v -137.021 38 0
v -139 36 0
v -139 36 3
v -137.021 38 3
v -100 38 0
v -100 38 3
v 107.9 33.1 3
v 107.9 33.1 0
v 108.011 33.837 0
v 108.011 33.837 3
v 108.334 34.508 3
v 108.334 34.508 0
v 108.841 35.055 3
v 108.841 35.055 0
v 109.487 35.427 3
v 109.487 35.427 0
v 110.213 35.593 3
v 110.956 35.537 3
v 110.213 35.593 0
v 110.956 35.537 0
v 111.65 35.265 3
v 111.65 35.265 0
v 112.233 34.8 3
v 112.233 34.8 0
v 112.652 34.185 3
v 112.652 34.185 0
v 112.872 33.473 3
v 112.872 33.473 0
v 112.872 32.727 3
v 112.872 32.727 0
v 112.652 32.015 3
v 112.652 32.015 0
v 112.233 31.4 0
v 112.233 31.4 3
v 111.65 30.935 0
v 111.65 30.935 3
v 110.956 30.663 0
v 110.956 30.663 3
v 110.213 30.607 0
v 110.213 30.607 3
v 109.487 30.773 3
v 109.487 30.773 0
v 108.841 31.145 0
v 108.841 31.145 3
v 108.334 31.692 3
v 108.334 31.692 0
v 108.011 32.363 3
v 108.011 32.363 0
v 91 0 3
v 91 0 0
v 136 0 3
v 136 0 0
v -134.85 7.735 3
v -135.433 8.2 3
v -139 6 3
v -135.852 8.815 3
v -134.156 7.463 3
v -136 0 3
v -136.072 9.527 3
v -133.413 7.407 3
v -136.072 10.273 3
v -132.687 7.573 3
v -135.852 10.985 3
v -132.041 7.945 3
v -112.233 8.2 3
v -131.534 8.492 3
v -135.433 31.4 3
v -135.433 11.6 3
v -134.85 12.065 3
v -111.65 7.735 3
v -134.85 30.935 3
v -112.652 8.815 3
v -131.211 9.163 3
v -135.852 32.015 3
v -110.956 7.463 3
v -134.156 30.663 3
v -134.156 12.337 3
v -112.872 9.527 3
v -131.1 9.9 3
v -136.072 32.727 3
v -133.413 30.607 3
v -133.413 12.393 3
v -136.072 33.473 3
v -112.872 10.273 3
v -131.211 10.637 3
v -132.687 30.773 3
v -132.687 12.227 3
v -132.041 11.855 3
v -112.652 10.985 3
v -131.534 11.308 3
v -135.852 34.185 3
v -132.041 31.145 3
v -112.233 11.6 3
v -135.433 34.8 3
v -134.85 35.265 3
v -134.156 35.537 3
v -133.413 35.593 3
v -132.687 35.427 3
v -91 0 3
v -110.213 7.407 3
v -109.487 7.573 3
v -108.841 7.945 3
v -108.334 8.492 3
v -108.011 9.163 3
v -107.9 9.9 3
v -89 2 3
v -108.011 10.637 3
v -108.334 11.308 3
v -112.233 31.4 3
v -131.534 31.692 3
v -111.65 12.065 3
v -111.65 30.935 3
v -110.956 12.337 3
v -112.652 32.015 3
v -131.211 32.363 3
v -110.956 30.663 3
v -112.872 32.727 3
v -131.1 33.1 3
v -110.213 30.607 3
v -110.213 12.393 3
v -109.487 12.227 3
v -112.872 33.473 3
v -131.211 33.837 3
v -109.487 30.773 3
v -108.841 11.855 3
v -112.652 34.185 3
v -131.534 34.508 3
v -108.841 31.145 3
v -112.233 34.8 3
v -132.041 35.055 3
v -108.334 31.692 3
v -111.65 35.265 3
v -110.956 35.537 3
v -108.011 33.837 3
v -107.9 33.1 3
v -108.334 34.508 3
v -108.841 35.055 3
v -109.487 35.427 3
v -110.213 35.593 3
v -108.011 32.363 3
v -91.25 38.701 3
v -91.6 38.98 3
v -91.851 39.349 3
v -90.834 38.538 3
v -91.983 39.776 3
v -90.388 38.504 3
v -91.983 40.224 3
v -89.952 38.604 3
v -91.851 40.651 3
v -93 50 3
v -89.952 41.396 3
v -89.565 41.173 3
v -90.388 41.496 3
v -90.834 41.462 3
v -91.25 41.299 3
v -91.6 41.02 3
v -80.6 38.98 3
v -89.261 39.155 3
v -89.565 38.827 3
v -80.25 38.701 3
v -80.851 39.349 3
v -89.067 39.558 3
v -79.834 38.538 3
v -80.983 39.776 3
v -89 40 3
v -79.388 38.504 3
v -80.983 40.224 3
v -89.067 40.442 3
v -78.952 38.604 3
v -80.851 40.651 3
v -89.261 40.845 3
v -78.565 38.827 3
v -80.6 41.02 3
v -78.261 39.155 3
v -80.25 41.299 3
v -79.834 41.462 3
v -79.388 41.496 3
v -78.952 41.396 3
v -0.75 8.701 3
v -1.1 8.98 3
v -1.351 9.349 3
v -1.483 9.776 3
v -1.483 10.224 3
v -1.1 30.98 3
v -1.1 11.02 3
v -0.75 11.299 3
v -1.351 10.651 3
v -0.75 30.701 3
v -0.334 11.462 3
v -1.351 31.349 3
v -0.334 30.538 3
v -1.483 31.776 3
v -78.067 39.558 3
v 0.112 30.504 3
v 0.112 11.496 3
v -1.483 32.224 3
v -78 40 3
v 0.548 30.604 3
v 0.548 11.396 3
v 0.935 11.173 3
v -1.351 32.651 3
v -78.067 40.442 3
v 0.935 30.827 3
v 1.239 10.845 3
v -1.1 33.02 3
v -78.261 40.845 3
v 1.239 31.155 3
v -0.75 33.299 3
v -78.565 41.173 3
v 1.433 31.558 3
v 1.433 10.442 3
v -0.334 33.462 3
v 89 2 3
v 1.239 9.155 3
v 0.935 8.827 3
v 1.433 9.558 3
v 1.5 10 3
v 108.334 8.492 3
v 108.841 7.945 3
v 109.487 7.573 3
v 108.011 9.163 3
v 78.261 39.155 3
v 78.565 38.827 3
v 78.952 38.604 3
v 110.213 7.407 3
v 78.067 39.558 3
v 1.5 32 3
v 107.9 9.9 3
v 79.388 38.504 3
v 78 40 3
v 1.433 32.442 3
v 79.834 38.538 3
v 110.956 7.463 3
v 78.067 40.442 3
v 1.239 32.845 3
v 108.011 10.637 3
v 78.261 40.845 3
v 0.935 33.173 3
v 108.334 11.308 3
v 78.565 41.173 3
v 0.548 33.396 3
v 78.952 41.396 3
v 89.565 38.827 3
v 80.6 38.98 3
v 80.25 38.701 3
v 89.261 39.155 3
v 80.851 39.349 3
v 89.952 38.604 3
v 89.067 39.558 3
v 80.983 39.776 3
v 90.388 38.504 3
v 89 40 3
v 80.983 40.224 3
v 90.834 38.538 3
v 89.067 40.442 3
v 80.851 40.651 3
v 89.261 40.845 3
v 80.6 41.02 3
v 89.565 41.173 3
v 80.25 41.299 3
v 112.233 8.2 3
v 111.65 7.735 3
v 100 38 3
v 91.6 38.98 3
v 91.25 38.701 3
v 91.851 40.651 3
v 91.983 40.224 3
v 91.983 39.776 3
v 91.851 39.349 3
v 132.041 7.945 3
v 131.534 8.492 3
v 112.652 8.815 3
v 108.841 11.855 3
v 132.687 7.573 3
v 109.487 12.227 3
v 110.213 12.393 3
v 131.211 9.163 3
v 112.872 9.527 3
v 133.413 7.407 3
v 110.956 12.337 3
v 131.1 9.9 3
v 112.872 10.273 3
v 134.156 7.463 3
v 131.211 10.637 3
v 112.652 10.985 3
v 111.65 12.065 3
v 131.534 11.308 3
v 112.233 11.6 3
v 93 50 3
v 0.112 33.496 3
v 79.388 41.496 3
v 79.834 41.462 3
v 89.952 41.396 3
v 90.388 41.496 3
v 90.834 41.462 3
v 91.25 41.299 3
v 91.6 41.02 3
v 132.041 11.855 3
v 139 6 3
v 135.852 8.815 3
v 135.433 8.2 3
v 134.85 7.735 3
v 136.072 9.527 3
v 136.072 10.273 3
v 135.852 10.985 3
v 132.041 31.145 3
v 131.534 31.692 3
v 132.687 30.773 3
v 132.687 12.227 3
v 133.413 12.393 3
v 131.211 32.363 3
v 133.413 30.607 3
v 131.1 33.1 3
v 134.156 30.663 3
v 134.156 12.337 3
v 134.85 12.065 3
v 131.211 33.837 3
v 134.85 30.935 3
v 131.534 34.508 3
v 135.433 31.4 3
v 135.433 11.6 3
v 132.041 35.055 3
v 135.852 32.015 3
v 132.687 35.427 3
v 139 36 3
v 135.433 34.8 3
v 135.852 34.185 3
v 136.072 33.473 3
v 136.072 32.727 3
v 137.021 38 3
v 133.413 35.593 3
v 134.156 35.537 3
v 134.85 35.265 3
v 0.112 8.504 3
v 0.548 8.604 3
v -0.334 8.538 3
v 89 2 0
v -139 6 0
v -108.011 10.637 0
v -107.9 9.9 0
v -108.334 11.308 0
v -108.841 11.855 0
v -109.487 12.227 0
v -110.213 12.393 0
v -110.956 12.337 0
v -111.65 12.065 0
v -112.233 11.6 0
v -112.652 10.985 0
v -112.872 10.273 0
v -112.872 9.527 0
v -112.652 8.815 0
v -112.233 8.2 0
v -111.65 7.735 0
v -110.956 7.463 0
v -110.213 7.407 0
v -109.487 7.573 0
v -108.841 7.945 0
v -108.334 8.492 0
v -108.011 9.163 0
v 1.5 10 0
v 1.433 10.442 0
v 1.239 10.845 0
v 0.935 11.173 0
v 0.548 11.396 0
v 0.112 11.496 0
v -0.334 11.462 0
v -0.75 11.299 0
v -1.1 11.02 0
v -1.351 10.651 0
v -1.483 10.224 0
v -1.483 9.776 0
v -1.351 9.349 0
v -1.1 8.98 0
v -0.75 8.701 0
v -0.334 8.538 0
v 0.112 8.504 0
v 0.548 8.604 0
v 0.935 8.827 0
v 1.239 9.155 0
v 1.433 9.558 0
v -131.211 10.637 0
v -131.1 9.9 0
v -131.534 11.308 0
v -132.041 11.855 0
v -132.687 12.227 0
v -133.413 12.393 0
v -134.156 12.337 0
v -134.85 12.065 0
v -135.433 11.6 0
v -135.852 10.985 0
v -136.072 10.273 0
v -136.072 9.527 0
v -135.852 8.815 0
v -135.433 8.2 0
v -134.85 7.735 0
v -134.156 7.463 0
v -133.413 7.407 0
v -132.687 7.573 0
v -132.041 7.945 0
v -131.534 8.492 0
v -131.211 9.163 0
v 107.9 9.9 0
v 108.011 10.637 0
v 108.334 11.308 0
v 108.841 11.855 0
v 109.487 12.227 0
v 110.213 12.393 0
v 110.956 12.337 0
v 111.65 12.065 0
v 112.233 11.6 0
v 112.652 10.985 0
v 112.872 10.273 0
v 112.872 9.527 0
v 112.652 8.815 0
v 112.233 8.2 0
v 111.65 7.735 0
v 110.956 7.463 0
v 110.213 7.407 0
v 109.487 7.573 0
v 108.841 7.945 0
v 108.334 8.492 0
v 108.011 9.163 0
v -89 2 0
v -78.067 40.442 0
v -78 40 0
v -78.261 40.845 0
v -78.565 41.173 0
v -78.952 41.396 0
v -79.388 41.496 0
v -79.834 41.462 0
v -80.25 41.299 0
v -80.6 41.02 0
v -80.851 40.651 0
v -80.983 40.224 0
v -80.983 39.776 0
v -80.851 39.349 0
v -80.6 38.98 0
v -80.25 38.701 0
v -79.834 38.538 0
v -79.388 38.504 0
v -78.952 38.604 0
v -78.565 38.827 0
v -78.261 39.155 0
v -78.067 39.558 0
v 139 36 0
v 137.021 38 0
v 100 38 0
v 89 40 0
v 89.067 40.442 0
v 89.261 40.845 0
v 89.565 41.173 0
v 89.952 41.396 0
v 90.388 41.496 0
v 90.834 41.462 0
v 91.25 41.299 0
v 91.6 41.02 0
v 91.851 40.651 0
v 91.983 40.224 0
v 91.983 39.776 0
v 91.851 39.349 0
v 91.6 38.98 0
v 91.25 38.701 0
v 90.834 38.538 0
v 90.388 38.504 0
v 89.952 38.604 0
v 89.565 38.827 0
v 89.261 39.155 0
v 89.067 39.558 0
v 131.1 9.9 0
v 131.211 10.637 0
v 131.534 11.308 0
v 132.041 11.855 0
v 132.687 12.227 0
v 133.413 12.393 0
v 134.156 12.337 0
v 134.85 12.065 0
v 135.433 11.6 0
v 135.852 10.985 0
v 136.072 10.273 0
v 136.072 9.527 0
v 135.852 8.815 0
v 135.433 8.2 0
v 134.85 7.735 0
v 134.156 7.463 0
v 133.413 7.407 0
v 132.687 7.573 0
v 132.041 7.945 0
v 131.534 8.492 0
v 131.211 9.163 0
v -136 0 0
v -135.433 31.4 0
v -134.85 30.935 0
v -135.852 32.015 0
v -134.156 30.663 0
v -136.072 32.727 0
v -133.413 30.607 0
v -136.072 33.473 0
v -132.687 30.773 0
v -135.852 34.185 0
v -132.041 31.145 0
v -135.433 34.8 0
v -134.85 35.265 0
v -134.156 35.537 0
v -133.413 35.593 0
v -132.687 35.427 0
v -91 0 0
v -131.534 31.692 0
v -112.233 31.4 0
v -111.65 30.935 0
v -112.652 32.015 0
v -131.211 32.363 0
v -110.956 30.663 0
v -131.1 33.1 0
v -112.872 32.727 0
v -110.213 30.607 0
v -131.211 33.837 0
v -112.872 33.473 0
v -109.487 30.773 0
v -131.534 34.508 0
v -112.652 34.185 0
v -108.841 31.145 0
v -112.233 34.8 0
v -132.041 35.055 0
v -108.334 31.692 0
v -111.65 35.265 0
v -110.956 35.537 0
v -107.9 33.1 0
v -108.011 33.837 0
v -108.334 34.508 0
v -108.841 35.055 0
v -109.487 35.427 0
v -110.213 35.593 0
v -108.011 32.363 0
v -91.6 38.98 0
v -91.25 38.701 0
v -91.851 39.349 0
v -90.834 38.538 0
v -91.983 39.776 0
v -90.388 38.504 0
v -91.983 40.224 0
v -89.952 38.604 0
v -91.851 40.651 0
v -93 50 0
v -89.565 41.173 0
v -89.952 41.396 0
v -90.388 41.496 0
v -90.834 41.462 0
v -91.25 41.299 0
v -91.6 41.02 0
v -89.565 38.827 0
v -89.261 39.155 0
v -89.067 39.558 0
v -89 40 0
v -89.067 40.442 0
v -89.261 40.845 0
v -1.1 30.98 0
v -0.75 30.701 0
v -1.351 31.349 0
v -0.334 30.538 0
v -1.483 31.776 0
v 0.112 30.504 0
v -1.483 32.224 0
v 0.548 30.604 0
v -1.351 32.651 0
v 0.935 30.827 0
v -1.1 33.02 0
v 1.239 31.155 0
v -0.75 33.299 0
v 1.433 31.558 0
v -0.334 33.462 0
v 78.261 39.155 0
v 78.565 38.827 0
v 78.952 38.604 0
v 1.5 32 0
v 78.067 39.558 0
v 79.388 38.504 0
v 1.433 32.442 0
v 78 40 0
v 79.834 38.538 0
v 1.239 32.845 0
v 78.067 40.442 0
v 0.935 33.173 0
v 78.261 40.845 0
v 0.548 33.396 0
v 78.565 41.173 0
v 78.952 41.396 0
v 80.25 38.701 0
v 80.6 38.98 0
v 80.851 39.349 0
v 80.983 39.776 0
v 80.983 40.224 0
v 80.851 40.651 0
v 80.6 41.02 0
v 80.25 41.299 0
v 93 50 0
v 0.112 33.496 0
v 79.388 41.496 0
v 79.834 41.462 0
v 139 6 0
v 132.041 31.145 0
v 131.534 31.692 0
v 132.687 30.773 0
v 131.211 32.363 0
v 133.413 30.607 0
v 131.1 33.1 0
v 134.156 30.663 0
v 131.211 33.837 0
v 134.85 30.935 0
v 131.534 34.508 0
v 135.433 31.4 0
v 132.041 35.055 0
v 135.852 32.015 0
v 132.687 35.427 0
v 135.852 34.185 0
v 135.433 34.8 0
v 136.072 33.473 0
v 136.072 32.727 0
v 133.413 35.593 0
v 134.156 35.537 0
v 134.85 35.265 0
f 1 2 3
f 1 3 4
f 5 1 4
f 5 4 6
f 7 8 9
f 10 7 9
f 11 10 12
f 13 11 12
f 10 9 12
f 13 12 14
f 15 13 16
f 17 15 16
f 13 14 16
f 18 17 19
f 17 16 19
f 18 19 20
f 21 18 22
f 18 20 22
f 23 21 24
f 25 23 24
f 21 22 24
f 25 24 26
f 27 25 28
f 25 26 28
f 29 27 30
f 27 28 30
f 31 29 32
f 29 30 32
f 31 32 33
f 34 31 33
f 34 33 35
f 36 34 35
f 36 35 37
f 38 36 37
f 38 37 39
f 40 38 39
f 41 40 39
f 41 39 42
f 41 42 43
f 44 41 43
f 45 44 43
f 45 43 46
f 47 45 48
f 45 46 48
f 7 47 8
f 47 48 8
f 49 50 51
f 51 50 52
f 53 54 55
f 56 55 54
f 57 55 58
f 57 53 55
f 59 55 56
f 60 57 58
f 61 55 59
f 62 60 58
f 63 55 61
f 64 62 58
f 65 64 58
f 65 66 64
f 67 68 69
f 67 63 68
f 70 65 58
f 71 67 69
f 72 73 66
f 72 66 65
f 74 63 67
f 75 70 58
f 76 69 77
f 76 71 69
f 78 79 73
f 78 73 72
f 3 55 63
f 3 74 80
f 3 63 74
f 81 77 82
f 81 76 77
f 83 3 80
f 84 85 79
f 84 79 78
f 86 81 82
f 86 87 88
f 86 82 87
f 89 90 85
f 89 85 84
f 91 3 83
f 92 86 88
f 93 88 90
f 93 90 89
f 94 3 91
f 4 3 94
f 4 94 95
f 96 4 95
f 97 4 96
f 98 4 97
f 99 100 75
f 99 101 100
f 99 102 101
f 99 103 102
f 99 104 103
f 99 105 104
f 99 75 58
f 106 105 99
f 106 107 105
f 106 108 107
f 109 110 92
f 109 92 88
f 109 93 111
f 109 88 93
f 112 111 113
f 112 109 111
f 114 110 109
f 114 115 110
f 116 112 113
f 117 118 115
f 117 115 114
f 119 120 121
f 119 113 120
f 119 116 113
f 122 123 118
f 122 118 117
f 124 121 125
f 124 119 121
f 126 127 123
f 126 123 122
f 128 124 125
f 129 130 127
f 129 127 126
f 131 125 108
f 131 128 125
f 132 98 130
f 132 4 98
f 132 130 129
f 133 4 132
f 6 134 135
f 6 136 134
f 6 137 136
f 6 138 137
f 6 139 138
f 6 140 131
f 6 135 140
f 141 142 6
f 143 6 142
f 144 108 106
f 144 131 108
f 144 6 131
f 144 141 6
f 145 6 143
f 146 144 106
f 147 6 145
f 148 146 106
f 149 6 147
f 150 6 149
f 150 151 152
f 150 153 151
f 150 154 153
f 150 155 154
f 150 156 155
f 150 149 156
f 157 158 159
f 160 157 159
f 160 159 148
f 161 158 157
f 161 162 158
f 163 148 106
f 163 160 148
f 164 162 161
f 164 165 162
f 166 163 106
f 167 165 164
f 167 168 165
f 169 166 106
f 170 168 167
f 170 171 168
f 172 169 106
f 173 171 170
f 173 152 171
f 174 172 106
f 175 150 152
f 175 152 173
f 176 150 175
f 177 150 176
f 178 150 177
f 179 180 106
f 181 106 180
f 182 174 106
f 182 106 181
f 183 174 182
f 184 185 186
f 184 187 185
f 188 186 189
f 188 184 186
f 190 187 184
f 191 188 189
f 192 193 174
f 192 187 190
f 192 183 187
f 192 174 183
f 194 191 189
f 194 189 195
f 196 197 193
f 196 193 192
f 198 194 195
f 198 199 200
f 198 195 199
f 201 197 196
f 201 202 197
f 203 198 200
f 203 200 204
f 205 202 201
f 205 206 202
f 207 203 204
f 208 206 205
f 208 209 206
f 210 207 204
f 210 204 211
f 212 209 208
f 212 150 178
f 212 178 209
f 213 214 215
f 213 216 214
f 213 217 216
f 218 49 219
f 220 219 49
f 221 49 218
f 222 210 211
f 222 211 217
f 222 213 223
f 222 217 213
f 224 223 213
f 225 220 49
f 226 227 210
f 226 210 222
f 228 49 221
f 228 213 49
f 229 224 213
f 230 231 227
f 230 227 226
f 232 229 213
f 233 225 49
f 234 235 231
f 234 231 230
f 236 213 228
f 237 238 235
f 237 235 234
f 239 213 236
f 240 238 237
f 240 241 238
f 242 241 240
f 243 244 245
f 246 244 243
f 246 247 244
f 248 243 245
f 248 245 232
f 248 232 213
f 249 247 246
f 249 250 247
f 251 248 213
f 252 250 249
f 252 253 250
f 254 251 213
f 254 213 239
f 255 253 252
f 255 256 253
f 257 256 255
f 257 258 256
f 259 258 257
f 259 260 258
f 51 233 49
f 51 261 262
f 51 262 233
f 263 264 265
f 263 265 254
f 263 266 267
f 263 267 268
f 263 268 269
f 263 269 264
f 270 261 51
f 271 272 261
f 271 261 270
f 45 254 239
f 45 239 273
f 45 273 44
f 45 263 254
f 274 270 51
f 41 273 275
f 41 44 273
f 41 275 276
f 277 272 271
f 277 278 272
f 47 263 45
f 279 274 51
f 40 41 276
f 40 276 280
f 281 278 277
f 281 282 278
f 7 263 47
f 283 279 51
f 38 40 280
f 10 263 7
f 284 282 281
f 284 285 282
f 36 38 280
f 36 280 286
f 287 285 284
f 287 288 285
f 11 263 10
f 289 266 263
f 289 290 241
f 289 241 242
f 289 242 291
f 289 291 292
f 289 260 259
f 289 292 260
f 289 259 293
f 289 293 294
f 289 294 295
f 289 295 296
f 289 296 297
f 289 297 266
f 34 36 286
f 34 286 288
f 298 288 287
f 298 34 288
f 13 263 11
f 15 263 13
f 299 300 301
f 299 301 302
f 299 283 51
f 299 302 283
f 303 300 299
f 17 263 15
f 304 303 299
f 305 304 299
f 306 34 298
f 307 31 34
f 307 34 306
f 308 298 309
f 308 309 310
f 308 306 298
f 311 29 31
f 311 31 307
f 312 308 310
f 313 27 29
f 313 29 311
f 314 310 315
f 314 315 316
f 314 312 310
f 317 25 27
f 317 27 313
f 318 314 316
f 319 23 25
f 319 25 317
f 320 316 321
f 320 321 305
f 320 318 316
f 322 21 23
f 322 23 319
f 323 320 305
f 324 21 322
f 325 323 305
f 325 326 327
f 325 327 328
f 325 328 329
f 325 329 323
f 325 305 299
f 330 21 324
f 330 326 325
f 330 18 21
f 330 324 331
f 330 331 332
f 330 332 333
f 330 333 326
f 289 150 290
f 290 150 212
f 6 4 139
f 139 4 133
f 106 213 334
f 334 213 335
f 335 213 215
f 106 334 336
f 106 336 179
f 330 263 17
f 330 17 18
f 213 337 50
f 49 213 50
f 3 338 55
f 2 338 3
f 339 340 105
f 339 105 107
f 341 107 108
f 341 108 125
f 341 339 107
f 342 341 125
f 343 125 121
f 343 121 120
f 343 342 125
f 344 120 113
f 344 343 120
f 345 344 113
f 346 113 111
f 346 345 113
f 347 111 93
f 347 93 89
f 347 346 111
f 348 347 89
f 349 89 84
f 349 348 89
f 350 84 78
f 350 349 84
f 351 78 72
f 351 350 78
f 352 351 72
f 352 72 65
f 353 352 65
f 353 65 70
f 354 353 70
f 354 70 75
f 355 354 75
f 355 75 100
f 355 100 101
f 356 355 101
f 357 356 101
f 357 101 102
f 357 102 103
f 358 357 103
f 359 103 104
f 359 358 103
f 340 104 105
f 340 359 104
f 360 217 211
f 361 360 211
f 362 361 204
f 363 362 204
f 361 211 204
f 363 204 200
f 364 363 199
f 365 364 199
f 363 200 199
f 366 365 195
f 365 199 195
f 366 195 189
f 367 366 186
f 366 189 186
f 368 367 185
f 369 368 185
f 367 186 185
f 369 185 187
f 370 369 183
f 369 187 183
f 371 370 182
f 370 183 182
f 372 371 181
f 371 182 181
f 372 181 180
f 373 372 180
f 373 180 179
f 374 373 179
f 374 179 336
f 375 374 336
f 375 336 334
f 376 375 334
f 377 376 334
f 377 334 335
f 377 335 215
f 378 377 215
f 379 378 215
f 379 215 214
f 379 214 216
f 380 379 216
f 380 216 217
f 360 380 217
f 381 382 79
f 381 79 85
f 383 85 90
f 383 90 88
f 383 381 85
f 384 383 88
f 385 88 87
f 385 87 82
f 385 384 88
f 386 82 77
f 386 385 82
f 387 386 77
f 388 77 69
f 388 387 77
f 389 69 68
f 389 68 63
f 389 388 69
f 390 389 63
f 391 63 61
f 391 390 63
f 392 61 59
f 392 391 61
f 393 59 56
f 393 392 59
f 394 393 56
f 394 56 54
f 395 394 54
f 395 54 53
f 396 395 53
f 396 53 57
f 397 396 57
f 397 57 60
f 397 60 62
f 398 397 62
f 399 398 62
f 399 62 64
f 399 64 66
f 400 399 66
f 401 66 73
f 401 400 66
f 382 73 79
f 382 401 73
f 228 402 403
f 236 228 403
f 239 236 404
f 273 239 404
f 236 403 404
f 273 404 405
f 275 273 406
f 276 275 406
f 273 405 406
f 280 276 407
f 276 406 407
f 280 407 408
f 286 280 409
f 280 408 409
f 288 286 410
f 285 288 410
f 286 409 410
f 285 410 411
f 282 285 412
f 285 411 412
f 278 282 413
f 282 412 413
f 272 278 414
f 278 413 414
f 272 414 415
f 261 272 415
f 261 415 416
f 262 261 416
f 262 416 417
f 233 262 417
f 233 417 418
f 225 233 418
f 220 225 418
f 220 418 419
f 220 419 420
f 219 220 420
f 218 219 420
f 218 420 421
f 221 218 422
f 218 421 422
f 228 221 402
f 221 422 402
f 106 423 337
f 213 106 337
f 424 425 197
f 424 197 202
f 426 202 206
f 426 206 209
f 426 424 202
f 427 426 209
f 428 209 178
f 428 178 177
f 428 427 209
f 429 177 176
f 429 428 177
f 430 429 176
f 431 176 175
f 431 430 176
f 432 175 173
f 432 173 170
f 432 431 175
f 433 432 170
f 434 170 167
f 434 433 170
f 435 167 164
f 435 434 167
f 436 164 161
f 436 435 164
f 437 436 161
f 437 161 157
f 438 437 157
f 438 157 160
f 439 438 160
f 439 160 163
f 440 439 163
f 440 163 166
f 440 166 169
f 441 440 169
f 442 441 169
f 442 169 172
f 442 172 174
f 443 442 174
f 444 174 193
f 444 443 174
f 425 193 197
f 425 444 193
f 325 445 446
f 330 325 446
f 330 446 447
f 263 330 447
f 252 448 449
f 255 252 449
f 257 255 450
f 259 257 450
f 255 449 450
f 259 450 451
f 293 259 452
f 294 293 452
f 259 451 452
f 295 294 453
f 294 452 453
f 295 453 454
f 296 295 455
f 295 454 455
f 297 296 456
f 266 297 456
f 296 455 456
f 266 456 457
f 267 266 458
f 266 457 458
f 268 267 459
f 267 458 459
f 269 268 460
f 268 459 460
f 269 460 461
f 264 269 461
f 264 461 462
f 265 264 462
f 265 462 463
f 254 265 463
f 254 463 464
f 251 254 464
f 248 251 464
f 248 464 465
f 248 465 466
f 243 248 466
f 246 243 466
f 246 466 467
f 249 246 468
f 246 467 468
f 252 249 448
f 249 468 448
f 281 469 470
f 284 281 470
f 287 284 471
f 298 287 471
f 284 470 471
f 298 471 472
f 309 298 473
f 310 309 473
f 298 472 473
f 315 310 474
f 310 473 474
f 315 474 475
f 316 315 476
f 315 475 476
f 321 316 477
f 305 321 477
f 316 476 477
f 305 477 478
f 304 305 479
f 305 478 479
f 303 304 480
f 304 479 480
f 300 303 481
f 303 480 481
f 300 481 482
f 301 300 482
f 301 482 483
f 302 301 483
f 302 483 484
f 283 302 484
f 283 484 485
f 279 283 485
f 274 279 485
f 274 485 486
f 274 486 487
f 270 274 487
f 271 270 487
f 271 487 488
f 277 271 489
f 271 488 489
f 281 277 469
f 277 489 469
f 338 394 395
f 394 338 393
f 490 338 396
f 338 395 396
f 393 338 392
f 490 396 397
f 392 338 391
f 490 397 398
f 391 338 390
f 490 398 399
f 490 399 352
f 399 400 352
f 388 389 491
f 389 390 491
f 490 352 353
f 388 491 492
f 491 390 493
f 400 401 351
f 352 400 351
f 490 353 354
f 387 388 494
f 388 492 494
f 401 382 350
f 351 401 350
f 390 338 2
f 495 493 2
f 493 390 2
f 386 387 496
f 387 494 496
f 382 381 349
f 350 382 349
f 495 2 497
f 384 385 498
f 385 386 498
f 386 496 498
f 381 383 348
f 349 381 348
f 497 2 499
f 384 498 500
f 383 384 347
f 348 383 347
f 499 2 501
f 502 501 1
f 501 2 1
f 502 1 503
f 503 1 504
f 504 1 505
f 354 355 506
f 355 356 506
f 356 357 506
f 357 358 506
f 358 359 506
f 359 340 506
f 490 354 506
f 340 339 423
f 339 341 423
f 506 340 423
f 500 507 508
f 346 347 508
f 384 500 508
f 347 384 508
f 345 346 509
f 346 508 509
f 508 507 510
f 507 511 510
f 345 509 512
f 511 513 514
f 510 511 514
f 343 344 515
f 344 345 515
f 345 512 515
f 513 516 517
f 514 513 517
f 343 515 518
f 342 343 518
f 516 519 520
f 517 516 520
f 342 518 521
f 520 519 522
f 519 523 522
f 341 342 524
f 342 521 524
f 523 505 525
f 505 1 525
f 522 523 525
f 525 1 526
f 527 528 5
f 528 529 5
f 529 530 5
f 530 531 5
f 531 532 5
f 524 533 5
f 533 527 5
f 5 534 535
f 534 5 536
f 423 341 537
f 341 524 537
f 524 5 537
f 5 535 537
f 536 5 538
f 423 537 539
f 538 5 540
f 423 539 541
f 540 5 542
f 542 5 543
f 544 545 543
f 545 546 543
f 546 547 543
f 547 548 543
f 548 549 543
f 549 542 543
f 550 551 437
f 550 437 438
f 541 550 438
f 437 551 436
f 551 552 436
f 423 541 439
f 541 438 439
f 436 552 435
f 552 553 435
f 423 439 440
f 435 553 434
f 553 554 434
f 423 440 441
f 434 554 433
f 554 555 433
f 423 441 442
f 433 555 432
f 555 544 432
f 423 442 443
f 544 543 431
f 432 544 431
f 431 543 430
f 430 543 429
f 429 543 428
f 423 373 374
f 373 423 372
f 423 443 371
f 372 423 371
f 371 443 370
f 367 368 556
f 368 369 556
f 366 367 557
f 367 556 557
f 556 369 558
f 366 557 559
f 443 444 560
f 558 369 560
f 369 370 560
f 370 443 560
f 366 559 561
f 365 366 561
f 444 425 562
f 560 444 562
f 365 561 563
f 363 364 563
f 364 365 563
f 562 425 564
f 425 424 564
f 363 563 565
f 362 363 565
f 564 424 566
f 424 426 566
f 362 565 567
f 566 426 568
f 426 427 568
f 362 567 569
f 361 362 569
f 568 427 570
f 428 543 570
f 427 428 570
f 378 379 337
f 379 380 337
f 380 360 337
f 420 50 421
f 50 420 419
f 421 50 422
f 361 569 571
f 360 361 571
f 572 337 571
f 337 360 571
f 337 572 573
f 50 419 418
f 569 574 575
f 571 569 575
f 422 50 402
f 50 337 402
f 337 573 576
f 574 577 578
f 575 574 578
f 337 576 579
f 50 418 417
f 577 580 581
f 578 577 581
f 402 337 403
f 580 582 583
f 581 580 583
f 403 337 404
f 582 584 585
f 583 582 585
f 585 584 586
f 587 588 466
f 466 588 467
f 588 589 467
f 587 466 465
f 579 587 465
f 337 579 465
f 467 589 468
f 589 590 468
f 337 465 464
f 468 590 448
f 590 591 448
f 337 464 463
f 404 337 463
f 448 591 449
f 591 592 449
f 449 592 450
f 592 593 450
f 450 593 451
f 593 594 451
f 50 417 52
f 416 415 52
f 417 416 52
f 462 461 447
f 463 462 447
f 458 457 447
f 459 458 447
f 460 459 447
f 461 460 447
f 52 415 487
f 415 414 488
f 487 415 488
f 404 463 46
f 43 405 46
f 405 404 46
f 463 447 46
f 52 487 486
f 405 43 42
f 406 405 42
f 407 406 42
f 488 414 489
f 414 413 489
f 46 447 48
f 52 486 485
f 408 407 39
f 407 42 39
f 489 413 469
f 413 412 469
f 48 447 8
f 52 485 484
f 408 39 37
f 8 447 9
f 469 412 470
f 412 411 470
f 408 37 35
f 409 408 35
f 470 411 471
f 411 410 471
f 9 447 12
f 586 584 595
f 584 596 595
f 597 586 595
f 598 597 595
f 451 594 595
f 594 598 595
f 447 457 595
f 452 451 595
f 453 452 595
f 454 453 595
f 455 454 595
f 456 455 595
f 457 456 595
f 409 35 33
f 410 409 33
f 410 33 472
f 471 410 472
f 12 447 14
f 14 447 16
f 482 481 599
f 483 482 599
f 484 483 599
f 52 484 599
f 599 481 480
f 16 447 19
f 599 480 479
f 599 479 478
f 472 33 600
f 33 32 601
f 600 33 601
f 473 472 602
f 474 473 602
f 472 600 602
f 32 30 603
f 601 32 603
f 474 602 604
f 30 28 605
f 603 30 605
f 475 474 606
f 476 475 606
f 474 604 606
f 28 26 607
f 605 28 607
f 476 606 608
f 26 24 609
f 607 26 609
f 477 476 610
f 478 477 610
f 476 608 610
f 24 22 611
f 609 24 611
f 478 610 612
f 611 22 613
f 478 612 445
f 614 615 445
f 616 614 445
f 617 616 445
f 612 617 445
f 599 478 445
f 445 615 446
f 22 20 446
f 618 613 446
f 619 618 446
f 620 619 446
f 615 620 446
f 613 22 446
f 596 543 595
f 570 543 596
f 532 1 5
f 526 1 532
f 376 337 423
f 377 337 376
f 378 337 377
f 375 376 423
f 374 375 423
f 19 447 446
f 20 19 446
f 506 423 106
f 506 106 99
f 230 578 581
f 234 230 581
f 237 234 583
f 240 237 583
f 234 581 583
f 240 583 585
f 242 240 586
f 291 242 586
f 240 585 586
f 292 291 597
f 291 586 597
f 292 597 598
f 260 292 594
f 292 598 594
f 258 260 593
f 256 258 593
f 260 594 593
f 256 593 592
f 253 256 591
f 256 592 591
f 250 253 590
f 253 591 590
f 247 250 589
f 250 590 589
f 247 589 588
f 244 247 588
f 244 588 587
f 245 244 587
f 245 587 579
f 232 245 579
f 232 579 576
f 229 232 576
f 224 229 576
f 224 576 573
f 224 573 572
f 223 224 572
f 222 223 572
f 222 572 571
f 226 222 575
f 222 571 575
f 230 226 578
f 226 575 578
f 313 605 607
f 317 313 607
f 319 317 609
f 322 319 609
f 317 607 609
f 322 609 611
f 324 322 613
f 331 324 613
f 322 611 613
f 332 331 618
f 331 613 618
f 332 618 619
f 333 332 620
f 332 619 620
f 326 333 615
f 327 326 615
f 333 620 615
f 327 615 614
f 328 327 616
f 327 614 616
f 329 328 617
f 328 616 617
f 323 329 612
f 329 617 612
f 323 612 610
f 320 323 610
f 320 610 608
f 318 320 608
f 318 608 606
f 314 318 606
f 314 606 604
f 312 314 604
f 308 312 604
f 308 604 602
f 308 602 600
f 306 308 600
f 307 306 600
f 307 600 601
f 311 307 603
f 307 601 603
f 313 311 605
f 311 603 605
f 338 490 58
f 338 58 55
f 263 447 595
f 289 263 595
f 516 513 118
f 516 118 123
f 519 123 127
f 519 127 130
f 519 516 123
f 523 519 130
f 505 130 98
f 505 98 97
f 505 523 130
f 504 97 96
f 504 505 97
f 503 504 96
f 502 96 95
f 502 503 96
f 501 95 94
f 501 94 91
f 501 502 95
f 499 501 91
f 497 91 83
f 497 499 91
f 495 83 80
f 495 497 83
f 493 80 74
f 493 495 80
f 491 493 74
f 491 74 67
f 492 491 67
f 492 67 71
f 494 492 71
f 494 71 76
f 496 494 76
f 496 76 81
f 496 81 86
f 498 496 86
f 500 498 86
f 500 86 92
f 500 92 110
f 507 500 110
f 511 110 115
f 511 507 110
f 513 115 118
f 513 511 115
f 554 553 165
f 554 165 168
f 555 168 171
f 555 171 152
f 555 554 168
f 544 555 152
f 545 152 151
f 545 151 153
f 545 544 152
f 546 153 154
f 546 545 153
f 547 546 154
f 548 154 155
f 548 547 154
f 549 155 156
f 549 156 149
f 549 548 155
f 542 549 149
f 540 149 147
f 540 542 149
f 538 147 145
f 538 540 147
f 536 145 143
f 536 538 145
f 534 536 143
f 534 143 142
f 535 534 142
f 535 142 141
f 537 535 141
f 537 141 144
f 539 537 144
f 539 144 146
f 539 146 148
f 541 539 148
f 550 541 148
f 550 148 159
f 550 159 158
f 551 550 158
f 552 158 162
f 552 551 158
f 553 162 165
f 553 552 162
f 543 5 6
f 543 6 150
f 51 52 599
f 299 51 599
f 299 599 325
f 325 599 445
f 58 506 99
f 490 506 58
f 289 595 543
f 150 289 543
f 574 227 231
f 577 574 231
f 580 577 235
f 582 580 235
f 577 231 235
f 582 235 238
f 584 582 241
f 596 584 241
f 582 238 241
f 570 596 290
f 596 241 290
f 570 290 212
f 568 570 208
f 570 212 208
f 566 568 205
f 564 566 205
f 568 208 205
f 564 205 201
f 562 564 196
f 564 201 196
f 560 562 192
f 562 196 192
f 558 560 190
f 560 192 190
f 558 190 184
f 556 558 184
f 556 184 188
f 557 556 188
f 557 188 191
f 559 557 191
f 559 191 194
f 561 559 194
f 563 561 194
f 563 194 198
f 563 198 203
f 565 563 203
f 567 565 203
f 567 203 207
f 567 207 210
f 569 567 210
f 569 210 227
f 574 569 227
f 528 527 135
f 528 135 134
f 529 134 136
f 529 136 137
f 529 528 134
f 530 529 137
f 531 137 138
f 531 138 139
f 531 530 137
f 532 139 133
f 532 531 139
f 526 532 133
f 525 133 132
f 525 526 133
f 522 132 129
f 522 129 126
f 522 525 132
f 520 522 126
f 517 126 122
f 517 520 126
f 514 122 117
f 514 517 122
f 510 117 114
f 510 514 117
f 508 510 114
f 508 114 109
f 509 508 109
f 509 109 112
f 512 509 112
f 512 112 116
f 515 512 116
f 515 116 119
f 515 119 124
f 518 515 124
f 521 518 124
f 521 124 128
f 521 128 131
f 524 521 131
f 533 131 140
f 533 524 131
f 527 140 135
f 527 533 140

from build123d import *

# Parameters (mm, degrees)
SKETCH_R     = 2.5
SKETCH_R_2   = 1.5
PAD_DEPTH    = 3
SKETCH001_R  = 1.5
POCKET_DEPTH = 3.001


with BuildPart() as part:
    # Sketch → Pad (new body)
    with BuildSketch(Plane.XY):
        Polygon((0, 50), (0, 2), (-89, 2), (-91, 0), (-136, 0), (-139, 6), (-139, 36), (-137.020835, 38), (-100, 38), (-93, 50), align=None)
        with Locations((-133.6, 33.1)):
            Circle(SKETCH_R, mode=Mode.SUBTRACT)
        with Locations((-110.4, 33.1)):
            Circle(SKETCH_R, mode=Mode.SUBTRACT)
        with Locations((-110.4, 9.9)):
            Circle(SKETCH_R, mode=Mode.SUBTRACT)
        with Locations((-133.6, 9.9)):
            Circle(SKETCH_R, mode=Mode.SUBTRACT)
        with Locations((-90.5, 40)):
            Circle(SKETCH_R_2, mode=Mode.SUBTRACT)
        with Locations((-79.5, 40)):
            Circle(SKETCH_R_2, mode=Mode.SUBTRACT)
    pad = extrude(amount=PAD_DEPTH)

    # Mirrored: Pad across Sketch V_Axis
    add(pad.mirror(Plane(origin=(0, 0, 0), x_dir=(0, 0, 1), z_dir=(1, 0, 0))))

    # Sketch001 → Pocket (cut, through all)
    with BuildSketch(Plane.XY.offset(3)):
        with Locations((0, 32)):
            Circle(SKETCH001_R)
        with Locations((0, 10)):
            Circle(SKETCH001_R)
    extrude(amount=-POCKET_DEPTH, mode=Mode.SUBTRACT)


solid = part.part
